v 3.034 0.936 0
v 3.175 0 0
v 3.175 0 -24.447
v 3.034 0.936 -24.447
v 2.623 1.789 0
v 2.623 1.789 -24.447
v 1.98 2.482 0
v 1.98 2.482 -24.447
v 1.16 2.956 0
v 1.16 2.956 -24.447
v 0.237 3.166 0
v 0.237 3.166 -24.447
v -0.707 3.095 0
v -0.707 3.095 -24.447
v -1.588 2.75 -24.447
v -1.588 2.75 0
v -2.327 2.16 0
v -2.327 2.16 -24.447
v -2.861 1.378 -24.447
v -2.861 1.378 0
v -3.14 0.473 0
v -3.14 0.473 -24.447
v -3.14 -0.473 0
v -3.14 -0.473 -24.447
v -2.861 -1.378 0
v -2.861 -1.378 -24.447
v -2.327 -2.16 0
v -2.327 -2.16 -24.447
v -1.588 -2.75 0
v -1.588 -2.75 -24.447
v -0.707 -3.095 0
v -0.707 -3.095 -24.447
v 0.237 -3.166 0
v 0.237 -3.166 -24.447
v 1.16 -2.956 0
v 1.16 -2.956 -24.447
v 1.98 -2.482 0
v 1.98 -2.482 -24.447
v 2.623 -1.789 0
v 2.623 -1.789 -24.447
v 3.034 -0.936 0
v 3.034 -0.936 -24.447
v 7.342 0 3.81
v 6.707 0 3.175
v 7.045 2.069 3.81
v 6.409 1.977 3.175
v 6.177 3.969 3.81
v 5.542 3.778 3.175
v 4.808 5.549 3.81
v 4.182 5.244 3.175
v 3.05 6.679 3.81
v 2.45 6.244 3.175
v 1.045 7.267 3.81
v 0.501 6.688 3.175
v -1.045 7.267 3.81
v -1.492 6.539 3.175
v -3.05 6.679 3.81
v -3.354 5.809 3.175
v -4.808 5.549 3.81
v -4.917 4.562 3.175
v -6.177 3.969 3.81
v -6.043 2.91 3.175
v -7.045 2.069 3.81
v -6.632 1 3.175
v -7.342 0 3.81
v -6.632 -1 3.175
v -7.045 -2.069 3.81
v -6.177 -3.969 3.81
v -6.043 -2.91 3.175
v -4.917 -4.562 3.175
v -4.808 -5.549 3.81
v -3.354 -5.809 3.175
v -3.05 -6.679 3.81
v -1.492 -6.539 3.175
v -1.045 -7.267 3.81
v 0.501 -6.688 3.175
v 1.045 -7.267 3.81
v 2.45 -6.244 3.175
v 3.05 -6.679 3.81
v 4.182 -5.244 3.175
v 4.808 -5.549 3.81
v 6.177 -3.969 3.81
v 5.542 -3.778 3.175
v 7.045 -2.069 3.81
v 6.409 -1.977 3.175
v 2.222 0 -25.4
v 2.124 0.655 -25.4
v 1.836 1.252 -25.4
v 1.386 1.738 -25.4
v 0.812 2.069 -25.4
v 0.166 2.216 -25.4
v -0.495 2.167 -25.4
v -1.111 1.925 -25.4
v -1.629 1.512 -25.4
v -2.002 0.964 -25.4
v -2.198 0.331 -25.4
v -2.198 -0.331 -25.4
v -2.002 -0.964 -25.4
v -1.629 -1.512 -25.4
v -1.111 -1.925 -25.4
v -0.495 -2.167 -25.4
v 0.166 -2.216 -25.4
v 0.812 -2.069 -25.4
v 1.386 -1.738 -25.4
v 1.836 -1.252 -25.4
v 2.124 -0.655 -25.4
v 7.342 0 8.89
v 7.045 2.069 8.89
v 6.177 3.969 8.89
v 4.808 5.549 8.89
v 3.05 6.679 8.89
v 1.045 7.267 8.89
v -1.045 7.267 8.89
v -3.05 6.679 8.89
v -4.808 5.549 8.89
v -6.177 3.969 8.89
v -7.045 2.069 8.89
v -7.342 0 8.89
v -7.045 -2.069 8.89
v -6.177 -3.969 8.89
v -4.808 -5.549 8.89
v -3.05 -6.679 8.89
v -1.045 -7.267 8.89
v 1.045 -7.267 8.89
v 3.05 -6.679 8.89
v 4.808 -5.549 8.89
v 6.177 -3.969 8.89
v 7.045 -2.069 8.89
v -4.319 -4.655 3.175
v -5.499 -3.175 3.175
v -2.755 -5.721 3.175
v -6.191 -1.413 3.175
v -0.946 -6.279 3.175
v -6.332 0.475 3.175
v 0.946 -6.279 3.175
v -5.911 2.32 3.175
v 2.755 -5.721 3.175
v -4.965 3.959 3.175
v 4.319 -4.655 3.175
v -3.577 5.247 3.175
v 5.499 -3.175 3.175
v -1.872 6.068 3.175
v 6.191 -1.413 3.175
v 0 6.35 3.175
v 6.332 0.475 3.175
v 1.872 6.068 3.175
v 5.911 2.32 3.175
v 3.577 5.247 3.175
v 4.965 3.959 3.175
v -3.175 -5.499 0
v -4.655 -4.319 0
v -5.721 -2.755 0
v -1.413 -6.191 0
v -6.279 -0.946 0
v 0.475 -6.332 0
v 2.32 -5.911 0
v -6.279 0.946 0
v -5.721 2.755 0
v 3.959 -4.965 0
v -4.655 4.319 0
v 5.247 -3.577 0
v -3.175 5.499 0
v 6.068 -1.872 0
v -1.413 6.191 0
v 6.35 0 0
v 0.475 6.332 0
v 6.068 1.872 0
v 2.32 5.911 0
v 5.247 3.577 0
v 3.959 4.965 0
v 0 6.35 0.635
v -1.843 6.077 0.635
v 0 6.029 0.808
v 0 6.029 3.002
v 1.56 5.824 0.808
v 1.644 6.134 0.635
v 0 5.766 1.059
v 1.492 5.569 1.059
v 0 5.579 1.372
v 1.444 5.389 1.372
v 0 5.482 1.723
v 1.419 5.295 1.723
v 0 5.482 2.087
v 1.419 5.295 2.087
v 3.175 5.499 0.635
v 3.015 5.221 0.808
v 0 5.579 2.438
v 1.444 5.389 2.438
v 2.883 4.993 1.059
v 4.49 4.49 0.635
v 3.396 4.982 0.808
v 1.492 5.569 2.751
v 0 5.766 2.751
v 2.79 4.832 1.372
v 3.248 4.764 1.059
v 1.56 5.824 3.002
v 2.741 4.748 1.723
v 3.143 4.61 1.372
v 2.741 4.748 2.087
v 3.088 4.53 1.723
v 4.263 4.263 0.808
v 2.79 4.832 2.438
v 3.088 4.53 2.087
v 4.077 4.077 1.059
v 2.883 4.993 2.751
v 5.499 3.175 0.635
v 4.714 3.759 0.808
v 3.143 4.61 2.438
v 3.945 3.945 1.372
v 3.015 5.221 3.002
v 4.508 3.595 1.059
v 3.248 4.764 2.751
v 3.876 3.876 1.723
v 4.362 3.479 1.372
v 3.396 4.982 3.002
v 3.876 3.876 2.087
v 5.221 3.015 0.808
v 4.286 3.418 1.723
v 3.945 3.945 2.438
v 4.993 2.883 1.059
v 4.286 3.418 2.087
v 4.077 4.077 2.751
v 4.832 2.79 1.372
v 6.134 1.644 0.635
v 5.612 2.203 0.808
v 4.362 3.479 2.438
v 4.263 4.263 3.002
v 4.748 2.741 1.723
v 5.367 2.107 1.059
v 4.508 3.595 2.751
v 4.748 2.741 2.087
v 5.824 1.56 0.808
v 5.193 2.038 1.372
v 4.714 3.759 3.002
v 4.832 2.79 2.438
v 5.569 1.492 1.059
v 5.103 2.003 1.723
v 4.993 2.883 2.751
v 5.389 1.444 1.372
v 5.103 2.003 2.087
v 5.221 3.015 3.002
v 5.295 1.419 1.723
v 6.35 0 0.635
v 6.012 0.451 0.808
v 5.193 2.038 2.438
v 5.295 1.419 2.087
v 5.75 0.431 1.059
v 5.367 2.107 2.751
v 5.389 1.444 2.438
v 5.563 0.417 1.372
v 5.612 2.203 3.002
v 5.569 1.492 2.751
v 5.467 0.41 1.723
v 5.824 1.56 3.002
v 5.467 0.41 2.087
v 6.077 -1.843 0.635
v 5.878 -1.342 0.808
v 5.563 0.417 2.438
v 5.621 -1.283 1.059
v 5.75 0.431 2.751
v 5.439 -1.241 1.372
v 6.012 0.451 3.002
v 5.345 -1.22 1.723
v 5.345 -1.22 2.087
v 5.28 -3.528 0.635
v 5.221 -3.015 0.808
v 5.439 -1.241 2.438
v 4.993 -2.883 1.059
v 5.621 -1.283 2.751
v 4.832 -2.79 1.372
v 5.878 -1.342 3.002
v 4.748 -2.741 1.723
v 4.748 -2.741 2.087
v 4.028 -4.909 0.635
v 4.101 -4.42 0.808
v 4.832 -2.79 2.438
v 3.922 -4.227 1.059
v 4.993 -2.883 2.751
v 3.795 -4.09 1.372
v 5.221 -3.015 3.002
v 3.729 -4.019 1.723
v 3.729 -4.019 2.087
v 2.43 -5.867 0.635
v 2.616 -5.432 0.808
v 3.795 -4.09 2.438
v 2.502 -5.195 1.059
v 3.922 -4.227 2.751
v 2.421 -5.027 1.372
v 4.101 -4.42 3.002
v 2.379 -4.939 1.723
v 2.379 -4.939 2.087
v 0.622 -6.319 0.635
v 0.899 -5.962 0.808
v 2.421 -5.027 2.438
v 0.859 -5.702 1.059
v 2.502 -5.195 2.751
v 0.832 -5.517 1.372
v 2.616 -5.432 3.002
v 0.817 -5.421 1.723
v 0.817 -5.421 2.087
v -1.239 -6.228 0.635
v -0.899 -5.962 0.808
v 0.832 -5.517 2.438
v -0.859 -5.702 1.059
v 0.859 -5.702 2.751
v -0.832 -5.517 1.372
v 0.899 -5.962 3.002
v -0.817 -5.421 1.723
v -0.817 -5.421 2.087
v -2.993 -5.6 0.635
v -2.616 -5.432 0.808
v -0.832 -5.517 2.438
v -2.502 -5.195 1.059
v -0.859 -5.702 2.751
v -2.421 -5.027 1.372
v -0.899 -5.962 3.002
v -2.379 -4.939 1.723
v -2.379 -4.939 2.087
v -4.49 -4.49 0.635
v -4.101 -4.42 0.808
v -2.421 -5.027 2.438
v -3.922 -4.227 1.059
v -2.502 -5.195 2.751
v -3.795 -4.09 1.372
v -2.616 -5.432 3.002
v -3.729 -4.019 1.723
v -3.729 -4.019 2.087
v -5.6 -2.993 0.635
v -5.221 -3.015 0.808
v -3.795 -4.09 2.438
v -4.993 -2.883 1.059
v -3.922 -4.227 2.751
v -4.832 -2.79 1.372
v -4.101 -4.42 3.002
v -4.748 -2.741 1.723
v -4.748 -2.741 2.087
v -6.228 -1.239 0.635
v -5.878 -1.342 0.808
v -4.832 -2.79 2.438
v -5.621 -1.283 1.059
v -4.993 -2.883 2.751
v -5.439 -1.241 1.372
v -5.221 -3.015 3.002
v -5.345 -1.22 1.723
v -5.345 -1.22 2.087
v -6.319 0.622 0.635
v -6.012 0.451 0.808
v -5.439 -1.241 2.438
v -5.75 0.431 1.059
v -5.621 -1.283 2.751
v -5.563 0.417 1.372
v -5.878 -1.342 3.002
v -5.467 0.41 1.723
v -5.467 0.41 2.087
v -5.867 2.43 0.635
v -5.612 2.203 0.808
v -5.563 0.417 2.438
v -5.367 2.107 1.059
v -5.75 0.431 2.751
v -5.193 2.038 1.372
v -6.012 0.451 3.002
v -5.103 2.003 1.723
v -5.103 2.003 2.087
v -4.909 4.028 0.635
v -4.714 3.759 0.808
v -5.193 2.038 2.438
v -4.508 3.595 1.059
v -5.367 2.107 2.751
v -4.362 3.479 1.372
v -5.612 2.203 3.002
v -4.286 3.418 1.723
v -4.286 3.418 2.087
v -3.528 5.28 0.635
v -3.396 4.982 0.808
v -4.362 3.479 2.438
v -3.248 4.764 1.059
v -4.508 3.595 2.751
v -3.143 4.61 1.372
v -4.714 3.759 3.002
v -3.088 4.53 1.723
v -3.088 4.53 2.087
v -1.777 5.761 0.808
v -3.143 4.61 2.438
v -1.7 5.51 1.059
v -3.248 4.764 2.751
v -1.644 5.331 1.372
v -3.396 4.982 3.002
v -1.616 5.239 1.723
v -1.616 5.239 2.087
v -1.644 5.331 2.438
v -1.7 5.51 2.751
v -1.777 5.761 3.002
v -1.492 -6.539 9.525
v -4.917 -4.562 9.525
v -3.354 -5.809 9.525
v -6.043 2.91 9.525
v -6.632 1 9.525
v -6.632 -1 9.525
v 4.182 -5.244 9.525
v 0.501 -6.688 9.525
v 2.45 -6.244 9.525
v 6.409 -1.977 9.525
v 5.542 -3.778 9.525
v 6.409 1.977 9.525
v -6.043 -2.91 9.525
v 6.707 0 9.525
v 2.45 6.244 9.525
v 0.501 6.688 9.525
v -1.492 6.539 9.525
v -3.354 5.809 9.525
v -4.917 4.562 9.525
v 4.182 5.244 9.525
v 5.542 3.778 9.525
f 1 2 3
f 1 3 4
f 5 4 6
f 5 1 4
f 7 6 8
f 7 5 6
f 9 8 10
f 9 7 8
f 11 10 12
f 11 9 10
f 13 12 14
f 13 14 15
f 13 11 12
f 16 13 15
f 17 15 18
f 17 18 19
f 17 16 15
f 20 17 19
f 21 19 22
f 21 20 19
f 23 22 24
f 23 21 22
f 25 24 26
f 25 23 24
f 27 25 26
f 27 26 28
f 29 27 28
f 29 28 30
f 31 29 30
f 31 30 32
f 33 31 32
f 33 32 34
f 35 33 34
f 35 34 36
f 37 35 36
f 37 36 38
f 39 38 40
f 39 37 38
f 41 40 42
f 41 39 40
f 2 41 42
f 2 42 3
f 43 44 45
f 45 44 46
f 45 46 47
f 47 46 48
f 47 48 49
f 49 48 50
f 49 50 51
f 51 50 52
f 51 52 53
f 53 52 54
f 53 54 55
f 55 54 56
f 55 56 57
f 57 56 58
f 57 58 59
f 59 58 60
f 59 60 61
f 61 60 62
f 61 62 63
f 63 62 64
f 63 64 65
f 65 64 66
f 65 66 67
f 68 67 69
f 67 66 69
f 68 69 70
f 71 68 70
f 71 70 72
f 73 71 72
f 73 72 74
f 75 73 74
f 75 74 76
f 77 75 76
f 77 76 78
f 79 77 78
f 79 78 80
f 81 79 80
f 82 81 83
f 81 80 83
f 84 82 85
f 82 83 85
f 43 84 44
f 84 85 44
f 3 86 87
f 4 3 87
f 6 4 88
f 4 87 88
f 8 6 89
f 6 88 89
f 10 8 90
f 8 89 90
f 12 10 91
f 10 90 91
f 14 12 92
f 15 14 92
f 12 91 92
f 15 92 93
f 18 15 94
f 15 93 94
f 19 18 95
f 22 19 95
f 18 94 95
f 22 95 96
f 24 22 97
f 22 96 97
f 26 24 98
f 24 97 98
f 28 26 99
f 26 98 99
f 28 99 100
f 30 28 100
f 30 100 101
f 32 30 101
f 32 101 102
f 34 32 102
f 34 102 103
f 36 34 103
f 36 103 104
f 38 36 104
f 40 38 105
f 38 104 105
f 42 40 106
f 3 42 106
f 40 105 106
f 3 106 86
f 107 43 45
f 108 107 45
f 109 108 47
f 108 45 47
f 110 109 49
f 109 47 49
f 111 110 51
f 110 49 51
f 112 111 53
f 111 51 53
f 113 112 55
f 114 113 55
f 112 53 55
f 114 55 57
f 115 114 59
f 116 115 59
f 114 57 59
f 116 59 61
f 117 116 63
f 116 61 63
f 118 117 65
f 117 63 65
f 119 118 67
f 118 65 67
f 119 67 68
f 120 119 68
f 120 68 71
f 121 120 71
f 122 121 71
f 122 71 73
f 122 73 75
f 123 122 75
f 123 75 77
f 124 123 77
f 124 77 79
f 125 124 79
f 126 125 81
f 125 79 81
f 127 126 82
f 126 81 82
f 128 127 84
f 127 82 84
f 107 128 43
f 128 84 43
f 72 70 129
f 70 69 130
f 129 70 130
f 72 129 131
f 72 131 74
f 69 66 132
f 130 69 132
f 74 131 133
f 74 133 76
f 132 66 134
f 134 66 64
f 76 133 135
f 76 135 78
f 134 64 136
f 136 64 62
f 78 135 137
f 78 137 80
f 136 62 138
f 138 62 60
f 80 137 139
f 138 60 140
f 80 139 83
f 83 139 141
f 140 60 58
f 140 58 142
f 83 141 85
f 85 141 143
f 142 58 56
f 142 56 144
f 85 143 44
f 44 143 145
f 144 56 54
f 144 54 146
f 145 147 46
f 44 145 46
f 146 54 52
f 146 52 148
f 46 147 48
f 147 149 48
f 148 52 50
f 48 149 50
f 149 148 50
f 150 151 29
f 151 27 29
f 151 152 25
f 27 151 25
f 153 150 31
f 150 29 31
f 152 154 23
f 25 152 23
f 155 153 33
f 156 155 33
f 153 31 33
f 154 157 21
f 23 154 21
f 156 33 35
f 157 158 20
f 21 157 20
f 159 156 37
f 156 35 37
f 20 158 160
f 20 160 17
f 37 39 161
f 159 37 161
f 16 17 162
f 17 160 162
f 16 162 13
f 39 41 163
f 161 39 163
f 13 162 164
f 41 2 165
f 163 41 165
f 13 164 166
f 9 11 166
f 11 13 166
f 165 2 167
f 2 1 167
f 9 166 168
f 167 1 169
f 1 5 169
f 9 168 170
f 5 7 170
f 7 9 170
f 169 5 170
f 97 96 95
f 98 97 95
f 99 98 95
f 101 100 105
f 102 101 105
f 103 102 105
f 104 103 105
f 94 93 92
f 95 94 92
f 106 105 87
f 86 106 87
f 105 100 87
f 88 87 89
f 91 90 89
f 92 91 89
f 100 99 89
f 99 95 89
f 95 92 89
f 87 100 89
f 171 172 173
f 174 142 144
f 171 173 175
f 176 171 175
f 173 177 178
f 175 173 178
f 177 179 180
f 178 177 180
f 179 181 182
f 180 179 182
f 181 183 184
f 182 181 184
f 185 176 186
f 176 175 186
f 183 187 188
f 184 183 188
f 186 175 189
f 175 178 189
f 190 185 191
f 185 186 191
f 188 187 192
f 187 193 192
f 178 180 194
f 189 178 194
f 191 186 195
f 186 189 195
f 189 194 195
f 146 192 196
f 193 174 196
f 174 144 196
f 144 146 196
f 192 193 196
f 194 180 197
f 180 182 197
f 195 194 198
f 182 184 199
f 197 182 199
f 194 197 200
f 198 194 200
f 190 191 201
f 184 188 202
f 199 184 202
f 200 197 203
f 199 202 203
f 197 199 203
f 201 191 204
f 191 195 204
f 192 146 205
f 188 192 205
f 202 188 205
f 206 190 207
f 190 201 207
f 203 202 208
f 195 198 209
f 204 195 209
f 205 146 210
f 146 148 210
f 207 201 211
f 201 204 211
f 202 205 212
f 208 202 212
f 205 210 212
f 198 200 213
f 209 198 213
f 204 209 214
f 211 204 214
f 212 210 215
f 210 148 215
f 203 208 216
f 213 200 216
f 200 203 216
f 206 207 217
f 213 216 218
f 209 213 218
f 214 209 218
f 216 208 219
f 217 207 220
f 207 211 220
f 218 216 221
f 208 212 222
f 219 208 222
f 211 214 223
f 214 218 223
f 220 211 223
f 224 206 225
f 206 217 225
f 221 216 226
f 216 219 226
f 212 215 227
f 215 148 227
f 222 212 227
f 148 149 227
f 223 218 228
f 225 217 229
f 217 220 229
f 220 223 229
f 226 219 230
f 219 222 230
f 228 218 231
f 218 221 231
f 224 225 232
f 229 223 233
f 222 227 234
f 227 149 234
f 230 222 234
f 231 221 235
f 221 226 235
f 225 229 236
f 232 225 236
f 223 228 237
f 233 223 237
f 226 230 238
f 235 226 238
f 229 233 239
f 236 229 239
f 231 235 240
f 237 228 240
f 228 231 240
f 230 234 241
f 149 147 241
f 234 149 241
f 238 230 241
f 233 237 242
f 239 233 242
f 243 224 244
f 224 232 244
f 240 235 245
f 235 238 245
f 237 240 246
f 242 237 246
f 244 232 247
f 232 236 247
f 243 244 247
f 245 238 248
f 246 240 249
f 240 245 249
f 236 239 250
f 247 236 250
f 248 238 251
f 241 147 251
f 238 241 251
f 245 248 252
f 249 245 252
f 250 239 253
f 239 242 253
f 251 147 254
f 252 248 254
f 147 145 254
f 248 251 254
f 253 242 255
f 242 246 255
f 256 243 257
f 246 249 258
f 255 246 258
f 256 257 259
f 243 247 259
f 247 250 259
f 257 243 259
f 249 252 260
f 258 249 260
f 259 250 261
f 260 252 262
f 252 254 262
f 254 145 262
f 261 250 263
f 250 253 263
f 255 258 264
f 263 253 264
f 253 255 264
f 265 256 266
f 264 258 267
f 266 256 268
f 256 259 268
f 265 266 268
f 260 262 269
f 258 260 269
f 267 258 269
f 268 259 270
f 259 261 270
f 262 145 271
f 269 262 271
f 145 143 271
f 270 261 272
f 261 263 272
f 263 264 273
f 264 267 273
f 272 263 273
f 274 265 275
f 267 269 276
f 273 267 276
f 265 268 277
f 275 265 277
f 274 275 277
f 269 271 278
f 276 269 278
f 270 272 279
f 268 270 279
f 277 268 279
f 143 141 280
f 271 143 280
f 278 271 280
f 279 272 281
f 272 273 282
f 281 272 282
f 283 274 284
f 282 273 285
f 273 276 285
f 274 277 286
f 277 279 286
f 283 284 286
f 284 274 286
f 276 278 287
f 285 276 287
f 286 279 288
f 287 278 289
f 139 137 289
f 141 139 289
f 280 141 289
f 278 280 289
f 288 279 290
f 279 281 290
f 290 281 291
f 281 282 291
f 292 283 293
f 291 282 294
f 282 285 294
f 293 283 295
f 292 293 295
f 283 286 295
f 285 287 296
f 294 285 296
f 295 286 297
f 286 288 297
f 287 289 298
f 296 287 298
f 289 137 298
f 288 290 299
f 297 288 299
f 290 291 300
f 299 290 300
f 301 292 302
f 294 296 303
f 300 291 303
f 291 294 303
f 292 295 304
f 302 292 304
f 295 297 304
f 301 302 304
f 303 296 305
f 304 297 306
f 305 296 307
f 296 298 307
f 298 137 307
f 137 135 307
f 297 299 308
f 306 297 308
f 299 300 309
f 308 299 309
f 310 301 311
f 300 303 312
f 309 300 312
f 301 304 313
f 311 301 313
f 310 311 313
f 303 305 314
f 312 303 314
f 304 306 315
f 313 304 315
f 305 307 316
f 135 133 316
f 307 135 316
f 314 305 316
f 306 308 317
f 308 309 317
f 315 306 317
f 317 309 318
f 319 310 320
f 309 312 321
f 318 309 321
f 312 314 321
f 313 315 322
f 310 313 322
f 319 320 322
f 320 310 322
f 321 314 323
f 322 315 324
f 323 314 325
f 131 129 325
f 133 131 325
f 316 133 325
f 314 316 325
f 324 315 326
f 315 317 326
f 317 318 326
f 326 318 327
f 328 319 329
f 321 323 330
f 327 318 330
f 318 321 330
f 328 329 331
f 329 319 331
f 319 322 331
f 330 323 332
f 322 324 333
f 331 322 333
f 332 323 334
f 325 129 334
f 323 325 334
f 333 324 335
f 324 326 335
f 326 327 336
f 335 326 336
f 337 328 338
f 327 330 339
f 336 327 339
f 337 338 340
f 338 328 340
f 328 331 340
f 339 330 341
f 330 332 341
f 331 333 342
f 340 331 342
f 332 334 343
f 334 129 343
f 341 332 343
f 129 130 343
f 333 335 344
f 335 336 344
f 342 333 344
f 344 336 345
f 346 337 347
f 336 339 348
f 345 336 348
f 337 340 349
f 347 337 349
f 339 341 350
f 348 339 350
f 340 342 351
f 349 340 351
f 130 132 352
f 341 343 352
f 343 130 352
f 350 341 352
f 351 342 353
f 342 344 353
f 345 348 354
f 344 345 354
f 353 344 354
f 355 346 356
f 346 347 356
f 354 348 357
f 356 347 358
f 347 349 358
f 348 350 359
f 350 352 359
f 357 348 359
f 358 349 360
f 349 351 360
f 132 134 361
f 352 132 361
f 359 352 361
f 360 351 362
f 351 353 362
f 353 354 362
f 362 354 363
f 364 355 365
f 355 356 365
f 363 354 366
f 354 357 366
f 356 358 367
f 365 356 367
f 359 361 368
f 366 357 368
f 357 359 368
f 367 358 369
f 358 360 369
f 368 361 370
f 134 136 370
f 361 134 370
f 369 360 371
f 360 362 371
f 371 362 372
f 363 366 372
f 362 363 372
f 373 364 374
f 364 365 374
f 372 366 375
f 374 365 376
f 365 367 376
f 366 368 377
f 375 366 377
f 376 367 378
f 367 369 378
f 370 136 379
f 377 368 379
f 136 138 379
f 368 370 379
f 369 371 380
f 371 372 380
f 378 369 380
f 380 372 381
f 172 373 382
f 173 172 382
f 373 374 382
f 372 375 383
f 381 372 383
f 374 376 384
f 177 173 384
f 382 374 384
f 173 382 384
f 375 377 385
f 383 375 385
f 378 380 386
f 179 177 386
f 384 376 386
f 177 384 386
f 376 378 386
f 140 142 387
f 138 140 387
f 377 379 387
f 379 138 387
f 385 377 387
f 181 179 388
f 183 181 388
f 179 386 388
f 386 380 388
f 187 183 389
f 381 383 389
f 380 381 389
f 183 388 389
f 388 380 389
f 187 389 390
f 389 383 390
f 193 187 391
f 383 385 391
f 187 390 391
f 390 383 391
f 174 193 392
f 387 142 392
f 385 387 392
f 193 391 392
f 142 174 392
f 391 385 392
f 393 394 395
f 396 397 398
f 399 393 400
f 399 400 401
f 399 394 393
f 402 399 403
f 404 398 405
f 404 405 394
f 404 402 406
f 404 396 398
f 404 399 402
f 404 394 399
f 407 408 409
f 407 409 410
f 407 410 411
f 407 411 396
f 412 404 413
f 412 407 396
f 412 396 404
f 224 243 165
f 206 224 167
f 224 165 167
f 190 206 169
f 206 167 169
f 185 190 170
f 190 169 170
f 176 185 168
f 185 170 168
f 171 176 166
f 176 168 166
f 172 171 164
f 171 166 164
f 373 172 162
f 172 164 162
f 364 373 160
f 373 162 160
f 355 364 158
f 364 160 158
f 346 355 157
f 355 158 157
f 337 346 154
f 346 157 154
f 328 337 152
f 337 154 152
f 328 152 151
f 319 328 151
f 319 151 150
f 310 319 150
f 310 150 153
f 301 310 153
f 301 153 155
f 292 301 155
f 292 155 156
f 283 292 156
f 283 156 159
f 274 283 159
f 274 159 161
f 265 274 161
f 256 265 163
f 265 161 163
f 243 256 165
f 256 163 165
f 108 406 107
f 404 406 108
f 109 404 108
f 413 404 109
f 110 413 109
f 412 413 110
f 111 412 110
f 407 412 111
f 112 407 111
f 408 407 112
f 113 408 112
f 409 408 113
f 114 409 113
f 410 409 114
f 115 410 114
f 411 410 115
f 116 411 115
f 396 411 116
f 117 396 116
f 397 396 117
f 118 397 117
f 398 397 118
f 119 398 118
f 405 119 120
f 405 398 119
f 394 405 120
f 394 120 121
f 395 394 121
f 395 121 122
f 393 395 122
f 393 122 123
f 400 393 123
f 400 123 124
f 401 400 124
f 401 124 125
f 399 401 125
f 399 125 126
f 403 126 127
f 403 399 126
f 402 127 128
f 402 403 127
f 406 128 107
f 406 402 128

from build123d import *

# Parameters (mm, degrees)
SKETCH1_R           = 3.175
EXTRUDE1_DEPTH      = 25.4
CHAMFER2_SIZE       = 0.9525
SKETCH27_R          = 6.35
BOSS_EXTRUDE4_DEPTH = 3.175
SKETCH21_R          = 7.3421875
BOSS_EXTRUDE1_DEPTH = 6.35
CHAMFER3_SIZE       = 0.635


with BuildPart() as part:
    # Sketch1 → Extrude1 (new body)
    with BuildSketch(Plane.XY):
        Circle(SKETCH1_R)
    extrude(amount=-EXTRUDE1_DEPTH)

    # Chamfer2
    chamfer2_edges = [part.edges().sort_by_distance(p)[0] for p in [
        (-3.175, 0, -25.4),
    ]]
    chamfer(chamfer2_edges, length=CHAMFER2_SIZE)

    # Sketch27 → Boss-Extrude4 (add)
    with BuildSketch(Plane.XY):
        Circle(SKETCH27_R)
    extrude(amount=BOSS_EXTRUDE4_DEPTH)

    # Sketch21 → Boss-Extrude1 (add)
    with BuildSketch(Plane.XY.offset(3.175)):
        Circle(SKETCH21_R)
    extrude(amount=BOSS_EXTRUDE1_DEPTH)

    # Sketch28 → Cut-Revolve1 (revolve, cut)
    with BuildSketch(Plane(origin=(0, 0, 0), x_dir=(0, 0, -1), z_dir=(1, 0, 0))):
        with BuildLine():
            Line((-3.175, 6.35), (-0.635, 6.35))
            ThreePointArc((-0.635, 6.35), (-1.905, 5.469889405), (-3.175, 6.35))
        make_face()
    revolve(axis=Axis((0, 0, 0), (0, 0, -1)), mode=Mode.SUBTRACT)

    # Chamfer3
    chamfer3_edges = [part.edges().sort_by_distance(p)[0] for p in [
        (-7.3421875, 0, 3.175),
        (-7.3421875, 0, 9.525),
    ]]
    chamfer(chamfer3_edges, length=CHAMFER3_SIZE)


solid = part.part
